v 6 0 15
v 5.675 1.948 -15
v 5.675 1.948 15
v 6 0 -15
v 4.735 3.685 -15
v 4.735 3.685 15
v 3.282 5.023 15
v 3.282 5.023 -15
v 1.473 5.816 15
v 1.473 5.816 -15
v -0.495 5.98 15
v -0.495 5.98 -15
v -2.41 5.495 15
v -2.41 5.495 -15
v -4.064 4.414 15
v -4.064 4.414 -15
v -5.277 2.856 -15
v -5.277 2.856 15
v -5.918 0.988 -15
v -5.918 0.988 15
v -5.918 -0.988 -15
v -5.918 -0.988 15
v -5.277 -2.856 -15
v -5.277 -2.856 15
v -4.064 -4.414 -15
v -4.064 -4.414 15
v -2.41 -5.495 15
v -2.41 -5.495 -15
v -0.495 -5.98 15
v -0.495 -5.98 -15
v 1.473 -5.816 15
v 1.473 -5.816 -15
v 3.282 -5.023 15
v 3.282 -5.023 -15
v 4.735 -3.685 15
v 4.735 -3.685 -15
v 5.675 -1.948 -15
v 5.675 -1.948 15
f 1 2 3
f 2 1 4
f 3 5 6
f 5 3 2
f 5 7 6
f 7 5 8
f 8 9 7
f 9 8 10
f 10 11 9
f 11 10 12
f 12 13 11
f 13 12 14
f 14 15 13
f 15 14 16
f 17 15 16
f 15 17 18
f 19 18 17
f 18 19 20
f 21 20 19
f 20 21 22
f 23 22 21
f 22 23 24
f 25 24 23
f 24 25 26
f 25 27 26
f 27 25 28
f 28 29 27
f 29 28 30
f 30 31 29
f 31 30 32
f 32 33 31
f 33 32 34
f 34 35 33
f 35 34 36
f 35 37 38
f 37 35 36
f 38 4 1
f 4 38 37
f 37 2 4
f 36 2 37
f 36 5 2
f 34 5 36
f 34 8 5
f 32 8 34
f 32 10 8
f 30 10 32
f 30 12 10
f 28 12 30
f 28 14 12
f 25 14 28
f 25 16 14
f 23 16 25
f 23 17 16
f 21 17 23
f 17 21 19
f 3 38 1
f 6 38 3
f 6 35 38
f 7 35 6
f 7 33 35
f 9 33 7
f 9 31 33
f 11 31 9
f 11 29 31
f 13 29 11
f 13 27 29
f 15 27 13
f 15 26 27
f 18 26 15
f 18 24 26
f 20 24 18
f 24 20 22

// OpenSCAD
difference() {
  *sphere(r=10);
  cylinder(h=30, r=6, center=true);
}
